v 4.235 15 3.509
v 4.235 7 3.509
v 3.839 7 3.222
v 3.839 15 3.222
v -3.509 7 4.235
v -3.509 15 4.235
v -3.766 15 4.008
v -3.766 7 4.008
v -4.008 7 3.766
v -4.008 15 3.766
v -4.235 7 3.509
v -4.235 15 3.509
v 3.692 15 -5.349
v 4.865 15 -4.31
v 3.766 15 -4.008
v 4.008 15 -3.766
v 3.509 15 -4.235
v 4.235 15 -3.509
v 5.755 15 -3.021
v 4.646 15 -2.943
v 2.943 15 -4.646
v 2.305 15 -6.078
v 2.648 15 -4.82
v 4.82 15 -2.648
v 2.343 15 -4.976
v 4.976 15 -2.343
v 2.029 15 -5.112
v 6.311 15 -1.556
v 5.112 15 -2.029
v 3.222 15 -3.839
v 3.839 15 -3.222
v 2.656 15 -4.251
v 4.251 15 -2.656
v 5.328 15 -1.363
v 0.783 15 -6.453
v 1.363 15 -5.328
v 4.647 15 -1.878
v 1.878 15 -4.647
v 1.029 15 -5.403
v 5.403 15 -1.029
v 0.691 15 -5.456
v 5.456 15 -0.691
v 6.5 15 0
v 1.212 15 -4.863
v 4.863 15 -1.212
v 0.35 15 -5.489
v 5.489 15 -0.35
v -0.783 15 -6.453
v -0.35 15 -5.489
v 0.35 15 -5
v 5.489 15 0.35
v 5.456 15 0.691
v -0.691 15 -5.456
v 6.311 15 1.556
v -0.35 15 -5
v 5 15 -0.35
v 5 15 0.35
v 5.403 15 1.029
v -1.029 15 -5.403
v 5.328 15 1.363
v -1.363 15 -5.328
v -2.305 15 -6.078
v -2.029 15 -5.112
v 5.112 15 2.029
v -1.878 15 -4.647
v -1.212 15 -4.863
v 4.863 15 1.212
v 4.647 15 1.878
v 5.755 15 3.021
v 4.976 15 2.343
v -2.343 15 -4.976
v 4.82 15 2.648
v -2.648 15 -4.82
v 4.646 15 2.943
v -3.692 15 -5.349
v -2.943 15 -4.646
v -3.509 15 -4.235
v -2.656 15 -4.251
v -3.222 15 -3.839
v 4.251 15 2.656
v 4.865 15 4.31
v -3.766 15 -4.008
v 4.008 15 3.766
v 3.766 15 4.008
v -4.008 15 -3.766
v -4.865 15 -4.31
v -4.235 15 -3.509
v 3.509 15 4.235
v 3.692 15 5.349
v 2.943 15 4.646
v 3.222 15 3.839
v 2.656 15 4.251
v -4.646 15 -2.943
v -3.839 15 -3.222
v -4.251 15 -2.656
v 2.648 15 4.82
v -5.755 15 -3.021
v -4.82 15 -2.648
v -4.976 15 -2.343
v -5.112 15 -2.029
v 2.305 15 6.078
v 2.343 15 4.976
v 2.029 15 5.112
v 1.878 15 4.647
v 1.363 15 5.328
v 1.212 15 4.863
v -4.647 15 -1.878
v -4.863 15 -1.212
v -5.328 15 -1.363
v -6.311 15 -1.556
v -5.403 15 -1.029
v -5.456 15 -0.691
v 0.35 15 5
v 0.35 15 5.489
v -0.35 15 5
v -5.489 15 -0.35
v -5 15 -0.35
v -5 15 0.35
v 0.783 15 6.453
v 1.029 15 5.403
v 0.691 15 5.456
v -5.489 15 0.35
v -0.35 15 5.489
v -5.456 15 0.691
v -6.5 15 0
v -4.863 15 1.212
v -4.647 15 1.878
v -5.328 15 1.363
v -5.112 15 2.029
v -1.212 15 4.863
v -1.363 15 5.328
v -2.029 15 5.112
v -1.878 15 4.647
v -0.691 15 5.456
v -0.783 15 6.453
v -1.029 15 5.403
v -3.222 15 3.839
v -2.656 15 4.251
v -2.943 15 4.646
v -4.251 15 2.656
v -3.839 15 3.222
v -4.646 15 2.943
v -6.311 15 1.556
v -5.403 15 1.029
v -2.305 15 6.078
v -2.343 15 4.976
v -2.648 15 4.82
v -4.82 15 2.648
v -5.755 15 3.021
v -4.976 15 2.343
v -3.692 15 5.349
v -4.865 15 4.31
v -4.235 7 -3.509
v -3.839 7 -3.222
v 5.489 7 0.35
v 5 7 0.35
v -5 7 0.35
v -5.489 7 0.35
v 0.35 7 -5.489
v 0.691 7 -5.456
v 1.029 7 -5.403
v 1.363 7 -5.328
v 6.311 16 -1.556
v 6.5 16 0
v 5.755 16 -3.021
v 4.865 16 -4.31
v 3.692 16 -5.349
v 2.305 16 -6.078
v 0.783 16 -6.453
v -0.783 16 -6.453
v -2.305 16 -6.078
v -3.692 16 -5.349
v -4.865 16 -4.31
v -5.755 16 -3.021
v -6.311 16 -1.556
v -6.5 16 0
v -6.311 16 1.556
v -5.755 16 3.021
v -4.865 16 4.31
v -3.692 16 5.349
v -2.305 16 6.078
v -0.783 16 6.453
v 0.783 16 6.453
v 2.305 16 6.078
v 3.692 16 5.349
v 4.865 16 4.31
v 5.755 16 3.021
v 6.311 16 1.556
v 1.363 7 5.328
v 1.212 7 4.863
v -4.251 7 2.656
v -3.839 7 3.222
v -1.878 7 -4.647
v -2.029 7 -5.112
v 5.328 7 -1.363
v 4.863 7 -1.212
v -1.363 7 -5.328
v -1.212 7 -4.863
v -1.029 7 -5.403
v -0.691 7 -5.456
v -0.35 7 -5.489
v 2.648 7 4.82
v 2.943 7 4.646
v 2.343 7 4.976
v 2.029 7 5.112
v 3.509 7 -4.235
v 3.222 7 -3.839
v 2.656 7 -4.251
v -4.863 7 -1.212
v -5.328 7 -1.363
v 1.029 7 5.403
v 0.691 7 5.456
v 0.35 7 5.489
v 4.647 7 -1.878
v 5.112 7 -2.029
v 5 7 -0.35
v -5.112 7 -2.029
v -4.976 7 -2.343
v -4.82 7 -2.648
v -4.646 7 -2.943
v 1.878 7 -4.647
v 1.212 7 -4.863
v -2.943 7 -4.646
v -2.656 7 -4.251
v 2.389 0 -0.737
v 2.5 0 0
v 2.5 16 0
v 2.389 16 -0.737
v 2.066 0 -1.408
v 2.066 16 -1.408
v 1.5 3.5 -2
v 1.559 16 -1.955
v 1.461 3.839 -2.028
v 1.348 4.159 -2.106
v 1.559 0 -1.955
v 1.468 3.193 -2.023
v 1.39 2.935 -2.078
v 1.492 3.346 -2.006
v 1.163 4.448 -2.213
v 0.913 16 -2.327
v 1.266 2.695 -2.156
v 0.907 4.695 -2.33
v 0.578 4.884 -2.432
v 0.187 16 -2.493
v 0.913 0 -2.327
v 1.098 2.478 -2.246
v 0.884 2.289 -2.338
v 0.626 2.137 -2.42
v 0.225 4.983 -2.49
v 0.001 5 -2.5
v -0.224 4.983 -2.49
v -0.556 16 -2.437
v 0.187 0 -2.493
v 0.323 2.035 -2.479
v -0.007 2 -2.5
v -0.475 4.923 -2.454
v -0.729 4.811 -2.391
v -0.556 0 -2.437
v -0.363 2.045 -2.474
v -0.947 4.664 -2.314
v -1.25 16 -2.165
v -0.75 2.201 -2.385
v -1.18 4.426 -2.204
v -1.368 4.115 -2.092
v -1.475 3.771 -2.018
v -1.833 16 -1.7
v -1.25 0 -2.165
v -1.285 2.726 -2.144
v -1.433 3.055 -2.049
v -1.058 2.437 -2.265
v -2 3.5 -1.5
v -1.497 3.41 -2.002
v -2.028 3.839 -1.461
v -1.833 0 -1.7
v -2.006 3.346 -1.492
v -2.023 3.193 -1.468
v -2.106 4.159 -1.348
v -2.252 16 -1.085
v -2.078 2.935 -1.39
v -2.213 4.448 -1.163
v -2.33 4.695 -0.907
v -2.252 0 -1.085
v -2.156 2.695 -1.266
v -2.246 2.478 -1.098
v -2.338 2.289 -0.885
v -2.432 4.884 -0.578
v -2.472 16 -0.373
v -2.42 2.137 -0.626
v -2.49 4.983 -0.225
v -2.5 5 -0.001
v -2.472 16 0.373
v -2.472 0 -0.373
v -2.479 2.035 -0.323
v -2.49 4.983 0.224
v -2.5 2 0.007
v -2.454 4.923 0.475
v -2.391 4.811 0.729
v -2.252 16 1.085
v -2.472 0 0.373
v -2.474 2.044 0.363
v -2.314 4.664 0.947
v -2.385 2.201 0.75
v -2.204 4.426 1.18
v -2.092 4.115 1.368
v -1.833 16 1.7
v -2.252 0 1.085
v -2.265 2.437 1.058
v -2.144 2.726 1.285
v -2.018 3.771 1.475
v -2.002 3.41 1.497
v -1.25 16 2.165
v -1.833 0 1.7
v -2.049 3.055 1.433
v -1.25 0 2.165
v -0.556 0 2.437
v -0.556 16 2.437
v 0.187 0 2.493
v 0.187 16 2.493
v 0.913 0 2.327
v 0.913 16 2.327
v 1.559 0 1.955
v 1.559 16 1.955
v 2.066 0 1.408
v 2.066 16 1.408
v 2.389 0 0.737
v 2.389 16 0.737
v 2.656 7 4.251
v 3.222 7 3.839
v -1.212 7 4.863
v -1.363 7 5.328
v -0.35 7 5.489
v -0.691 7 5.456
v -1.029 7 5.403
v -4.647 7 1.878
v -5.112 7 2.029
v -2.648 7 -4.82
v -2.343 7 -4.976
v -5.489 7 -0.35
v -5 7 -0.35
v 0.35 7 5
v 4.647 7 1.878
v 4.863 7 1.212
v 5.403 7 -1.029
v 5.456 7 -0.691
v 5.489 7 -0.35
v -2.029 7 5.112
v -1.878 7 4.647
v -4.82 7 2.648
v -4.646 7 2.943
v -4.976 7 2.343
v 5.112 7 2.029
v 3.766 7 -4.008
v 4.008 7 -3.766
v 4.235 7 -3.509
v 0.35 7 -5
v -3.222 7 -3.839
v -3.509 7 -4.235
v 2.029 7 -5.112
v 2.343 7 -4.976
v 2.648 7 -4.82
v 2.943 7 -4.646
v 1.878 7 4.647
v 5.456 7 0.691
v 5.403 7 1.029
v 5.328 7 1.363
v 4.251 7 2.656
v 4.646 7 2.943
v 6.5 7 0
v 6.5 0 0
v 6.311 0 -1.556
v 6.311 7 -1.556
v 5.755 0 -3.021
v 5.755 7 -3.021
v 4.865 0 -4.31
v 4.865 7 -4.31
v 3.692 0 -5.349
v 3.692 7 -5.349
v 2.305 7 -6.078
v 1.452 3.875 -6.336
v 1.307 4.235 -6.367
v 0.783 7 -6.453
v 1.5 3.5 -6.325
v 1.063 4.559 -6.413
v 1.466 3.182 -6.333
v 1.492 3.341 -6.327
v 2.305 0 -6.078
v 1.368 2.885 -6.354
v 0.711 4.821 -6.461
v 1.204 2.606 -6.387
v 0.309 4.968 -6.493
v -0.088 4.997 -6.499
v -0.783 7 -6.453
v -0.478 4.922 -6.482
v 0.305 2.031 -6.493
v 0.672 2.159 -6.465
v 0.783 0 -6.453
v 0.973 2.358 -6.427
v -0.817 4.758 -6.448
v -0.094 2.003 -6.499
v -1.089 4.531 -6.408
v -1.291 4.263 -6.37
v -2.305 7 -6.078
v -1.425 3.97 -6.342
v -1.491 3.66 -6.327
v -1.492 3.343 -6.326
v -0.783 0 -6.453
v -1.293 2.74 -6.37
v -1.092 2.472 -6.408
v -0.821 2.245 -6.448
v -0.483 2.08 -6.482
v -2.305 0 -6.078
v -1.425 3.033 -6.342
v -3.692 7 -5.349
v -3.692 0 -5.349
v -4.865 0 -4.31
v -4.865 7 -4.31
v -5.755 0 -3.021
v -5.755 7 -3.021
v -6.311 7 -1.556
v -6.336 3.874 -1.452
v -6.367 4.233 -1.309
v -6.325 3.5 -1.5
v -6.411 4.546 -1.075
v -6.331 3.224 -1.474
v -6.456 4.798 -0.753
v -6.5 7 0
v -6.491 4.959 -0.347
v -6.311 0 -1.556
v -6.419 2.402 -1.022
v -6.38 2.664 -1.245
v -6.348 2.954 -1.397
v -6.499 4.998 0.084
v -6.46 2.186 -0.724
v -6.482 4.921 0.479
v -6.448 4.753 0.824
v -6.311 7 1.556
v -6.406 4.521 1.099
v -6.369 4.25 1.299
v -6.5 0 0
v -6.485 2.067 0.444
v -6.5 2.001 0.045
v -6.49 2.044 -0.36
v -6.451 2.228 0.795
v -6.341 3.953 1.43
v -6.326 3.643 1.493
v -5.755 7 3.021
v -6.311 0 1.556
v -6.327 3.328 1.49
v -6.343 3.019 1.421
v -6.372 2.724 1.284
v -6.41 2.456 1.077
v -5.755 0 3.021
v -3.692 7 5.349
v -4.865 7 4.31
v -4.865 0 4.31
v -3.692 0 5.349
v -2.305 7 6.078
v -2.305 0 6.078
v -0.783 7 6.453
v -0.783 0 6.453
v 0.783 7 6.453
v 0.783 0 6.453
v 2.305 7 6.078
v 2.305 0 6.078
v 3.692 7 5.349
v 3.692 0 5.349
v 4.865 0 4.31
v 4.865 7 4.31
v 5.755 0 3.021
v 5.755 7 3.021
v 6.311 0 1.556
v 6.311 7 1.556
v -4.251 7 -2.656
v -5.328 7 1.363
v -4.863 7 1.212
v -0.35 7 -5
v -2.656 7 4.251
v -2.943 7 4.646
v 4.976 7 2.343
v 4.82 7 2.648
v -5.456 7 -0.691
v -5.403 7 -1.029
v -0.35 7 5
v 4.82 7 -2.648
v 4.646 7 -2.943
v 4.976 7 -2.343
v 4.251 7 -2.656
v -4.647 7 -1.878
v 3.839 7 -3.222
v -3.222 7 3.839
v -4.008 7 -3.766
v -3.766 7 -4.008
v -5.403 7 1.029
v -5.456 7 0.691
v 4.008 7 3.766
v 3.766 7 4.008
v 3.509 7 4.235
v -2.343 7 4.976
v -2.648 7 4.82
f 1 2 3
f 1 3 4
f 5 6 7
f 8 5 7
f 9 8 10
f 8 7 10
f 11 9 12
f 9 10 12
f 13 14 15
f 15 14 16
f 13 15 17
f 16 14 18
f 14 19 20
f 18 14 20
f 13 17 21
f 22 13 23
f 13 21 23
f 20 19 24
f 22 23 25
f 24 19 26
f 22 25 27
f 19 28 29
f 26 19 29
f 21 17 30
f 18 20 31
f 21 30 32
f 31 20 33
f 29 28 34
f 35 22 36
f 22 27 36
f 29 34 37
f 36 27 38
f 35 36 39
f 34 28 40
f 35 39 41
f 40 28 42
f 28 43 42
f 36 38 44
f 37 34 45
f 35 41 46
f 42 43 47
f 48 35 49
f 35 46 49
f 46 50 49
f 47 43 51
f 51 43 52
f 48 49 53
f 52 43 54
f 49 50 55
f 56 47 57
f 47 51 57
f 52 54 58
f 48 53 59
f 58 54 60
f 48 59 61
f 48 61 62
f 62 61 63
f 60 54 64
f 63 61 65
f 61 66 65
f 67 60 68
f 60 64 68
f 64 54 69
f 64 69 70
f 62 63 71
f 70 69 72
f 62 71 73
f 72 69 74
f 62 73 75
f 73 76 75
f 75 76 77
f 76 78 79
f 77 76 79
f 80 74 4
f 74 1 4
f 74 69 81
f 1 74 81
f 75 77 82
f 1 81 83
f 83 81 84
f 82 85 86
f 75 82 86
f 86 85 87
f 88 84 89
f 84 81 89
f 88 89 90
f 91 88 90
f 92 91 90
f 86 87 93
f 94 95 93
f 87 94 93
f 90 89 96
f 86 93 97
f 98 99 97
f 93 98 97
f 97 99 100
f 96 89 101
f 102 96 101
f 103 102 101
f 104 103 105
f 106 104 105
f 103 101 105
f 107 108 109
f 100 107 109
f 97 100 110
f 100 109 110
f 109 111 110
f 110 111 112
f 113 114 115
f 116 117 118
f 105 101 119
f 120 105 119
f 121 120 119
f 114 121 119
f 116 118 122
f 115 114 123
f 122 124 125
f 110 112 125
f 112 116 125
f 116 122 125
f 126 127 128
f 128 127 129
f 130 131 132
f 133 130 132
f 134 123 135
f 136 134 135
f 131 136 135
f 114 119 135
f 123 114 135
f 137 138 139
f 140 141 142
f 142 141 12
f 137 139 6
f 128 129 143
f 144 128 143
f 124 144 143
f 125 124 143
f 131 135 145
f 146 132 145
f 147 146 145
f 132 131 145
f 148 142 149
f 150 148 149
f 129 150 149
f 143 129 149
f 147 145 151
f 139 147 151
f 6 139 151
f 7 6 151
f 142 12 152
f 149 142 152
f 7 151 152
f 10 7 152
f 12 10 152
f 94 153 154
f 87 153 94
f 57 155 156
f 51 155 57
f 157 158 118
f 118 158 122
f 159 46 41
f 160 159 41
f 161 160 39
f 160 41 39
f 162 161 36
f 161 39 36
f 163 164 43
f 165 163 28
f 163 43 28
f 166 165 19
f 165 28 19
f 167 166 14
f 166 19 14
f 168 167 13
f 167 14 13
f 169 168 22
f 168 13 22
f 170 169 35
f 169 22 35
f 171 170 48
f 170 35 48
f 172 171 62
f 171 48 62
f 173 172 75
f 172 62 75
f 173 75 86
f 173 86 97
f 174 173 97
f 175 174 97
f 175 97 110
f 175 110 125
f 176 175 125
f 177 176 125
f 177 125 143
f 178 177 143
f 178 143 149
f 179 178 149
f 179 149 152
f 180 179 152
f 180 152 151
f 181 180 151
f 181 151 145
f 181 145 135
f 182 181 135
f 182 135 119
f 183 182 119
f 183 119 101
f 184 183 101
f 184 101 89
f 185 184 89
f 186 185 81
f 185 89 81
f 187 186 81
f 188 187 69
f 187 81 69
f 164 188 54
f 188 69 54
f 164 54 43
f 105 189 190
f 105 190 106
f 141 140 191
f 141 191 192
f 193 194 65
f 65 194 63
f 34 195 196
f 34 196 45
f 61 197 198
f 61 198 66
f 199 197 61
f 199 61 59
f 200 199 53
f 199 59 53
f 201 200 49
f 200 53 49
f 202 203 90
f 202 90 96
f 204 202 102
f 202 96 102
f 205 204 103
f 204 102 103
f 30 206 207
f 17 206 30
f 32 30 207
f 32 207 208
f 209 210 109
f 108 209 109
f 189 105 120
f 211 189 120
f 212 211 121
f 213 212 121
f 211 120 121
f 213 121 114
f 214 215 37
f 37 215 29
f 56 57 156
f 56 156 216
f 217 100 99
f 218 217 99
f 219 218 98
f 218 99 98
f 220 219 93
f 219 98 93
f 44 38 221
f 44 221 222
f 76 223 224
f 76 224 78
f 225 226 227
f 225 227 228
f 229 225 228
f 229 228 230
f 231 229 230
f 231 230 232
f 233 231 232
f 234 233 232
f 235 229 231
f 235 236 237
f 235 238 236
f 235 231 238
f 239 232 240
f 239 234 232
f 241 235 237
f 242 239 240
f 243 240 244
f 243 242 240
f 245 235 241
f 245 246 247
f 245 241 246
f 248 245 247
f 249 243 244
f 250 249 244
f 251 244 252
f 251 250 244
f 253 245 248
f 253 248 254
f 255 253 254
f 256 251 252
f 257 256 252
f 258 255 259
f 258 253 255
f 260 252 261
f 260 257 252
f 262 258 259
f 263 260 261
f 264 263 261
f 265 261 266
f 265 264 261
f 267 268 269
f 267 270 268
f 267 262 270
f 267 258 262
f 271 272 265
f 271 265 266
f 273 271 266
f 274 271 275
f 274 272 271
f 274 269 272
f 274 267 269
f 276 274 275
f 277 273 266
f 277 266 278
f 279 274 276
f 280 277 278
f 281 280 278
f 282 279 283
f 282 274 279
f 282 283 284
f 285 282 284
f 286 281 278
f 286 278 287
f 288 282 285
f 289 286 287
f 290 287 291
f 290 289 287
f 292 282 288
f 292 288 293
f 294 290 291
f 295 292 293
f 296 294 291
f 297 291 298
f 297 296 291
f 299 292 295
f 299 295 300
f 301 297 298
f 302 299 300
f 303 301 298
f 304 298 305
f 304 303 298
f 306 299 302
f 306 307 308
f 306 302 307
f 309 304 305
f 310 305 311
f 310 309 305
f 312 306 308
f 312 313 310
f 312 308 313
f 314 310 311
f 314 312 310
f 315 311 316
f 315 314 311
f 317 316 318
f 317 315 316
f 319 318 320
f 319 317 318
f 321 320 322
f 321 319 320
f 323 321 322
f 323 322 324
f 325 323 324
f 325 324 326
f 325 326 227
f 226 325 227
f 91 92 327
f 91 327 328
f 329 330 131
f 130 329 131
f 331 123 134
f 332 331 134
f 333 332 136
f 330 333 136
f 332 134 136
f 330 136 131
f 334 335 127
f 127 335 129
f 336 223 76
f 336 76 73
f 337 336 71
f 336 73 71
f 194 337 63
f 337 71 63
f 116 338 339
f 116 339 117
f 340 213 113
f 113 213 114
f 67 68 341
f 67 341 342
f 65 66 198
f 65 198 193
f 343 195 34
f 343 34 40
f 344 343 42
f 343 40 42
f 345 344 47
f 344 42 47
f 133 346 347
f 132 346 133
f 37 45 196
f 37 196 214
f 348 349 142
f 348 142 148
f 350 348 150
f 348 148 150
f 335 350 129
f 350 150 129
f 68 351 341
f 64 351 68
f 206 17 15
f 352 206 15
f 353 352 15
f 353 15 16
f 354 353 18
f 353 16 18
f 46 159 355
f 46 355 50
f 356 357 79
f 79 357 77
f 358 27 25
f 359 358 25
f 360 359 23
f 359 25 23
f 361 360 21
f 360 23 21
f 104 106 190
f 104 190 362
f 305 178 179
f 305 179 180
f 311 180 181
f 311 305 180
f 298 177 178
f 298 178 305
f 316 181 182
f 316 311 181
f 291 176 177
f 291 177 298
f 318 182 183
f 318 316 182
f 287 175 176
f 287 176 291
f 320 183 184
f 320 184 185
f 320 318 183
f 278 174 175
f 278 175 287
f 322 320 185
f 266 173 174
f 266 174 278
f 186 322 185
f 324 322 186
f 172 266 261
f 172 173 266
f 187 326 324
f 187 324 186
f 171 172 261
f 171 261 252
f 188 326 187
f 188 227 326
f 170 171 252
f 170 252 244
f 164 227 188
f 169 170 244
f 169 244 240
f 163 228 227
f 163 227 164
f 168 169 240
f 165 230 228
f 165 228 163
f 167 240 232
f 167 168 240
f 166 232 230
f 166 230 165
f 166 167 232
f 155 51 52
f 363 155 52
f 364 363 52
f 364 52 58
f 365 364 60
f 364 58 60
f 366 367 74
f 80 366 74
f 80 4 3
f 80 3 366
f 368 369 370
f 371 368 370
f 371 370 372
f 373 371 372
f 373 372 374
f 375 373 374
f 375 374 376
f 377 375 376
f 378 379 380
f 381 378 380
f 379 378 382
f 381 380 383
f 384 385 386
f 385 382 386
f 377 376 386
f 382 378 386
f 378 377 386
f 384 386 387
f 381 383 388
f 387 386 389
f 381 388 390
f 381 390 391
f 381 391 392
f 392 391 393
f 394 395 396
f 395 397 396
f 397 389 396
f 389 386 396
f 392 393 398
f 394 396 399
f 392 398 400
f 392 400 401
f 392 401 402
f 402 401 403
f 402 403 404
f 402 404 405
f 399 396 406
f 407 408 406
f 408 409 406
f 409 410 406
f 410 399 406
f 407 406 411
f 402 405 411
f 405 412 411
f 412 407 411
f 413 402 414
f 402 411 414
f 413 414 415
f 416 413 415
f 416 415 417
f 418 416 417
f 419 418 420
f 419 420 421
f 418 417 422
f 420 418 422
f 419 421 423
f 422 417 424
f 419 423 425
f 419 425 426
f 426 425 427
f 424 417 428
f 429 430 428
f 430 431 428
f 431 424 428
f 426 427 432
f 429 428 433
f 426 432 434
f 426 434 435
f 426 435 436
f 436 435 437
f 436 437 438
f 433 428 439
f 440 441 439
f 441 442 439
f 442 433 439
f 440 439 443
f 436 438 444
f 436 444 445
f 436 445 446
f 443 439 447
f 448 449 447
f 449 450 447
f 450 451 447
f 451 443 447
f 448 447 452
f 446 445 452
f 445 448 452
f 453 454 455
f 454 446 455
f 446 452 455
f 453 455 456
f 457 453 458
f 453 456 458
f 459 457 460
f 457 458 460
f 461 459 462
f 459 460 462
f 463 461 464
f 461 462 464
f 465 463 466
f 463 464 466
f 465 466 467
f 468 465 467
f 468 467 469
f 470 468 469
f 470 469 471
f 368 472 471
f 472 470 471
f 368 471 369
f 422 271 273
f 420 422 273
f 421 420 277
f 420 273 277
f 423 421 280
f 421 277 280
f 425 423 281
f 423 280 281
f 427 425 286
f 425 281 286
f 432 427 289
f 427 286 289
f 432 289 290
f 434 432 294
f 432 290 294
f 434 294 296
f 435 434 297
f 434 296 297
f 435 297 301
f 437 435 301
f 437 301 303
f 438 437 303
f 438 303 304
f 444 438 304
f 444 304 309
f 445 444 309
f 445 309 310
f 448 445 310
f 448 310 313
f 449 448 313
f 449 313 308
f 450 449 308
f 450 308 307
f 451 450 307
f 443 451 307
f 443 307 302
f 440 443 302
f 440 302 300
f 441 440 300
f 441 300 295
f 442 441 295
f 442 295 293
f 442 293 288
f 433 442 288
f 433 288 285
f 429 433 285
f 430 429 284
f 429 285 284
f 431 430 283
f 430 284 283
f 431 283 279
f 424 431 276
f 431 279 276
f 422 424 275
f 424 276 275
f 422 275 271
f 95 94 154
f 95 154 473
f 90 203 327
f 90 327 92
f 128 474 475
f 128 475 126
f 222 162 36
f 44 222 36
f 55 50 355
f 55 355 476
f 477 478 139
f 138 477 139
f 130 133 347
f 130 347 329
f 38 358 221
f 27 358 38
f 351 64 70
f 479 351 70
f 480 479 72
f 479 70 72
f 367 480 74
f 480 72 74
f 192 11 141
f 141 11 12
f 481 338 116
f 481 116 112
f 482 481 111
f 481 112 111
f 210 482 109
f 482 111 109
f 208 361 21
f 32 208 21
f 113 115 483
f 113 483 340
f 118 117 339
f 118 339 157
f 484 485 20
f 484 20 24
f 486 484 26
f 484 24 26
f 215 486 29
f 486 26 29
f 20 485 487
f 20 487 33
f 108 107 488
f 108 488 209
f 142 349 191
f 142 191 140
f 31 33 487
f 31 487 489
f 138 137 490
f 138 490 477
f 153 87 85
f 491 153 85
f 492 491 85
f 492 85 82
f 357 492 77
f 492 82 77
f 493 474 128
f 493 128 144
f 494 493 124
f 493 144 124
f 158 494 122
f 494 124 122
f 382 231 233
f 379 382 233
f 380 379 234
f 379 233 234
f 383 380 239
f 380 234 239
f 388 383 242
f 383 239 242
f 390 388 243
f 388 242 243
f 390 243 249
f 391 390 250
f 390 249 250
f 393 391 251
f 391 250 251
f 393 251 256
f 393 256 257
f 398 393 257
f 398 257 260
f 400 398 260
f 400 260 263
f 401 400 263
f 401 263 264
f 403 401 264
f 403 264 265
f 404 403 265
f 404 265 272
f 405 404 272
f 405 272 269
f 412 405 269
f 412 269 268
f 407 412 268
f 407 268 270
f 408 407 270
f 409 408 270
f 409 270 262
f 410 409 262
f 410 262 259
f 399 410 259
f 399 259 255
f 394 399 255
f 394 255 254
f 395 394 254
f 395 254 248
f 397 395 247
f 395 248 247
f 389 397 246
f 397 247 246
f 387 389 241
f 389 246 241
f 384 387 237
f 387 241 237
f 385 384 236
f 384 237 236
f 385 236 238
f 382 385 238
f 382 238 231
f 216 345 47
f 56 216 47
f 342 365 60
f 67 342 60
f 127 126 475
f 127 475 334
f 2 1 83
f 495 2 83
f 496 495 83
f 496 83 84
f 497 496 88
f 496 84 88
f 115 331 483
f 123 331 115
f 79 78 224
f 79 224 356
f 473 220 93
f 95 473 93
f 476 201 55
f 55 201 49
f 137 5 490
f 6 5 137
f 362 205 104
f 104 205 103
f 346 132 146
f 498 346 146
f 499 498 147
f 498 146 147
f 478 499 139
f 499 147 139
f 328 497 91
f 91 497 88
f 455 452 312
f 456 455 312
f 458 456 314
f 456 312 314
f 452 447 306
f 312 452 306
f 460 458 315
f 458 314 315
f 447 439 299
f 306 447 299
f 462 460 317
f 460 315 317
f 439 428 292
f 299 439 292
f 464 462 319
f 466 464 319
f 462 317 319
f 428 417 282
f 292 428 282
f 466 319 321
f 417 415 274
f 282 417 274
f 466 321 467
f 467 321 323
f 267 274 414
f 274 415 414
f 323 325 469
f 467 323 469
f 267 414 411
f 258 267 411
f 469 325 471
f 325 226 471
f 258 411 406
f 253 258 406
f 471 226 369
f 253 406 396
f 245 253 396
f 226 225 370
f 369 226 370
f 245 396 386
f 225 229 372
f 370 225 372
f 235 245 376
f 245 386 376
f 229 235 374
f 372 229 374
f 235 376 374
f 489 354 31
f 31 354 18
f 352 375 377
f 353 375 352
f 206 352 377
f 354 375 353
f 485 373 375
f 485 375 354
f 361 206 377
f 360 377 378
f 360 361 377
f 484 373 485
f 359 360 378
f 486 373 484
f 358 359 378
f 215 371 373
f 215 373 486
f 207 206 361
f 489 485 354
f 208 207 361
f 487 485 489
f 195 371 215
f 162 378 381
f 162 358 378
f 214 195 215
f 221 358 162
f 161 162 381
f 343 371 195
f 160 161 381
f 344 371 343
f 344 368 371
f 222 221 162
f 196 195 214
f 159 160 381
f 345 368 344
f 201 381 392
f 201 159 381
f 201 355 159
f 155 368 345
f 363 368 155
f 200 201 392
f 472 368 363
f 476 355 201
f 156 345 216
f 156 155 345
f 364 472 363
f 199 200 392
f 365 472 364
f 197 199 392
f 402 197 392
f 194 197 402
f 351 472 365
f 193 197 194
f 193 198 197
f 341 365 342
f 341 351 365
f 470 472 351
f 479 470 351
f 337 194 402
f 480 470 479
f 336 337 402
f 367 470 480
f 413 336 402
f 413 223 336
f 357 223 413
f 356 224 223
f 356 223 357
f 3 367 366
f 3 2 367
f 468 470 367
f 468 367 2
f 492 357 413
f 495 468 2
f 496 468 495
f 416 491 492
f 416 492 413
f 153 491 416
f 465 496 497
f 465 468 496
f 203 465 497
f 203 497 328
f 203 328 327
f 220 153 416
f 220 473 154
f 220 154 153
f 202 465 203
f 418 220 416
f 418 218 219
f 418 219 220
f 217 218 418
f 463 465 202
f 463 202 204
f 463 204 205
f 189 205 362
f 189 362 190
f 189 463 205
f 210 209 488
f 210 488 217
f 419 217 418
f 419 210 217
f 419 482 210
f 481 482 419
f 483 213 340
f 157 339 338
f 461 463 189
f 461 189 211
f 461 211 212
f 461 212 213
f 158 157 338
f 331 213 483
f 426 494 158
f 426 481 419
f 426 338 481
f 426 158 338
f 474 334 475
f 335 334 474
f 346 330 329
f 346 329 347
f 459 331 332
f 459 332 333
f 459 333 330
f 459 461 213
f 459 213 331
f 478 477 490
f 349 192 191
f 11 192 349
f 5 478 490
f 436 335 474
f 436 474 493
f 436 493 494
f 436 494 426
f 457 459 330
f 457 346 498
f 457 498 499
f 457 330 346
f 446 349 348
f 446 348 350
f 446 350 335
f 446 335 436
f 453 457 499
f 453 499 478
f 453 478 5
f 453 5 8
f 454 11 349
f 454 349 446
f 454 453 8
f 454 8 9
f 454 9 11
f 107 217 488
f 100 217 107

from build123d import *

# Parameters (mm, degrees)
SKETCH1_R           = 6.5
SKETCH1_R_2         = 2.5
BOSS_EXTRUDE1_DEPTH = 16
SKETCH2_W           = 1
SKETCH2_H           = 8
SKETCH3_R           = 1.5
CUT_EXTRUDE1_DEPTH  = 7.5
CIRPATTERN1_COUNT   = 2
CIRPATTERN1_ANGLE   = 90
SKETCH6_W           = 0.7
SKETCH6_H           = 8
CUT_EXTRUDE2_DEPTH  = 0.5
CIRPATTERN2_COUNT   = 20


with BuildPart() as part:
    # Sketch1 → Boss-Extrude1 (new body)
    with BuildSketch(Plane(origin=(0, 0, 0), x_dir=(1, 0, 0), z_dir=(0, 1, 0))):
        Circle(SKETCH1_R)
        Circle(SKETCH1_R_2, mode=Mode.SUBTRACT)
    extrude(amount=BOSS_EXTRUDE1_DEPTH)

    # Sketch2 → Cut-Revolve1 (revolve, cut)
    with BuildSketch(Plane.XY):
        with Locations((6, 11)):
            Rectangle(SKETCH2_W, SKETCH2_H)
    revolve(axis=Axis((0, 18.194841433, 0), (0, -1, 0)), mode=Mode.SUBTRACT)

    # Sketch3 → Cut-Extrude1 (cut, through all)
    with BuildSketch(Plane.XY):
        with Locations((0, 3.5)):
            Circle(SKETCH3_R)
    cut_extrude1 = extrude(amount=-CUT_EXTRUDE1_DEPTH, mode=Mode.SUBTRACT)

    # CirPattern1: Cut-Extrude1 ×2 about axis
    cirpattern1_axis = Axis((0, 16, 0), (0, 1, 0))
    for i in range(1, CIRPATTERN1_COUNT):
        add(cut_extrude1.rotate(cirpattern1_axis, i * CIRPATTERN1_ANGLE / (CIRPATTERN1_COUNT - 1)), mode=Mode.SUBTRACT)

    # Sketch6 → Cut-Extrude2 (cut)
    with BuildSketch(Plane.XY.offset(5.5)):
        with Locations((0, 11)):
            Rectangle(SKETCH6_W, SKETCH6_H)
    cut_extrude2 = extrude(amount=-CUT_EXTRUDE2_DEPTH, mode=Mode.SUBTRACT)

    # CirPattern2: Cut-Extrude2 ×20 about axis
    cirpattern2_axis = Axis((0, 0, 0), (0, 1, 0))
    for i in range(1, CIRPATTERN2_COUNT):
        add(cut_extrude2.rotate(cirpattern2_axis, i * 360 / CIRPATTERN2_COUNT), mode=Mode.SUBTRACT)


solid = part.part
